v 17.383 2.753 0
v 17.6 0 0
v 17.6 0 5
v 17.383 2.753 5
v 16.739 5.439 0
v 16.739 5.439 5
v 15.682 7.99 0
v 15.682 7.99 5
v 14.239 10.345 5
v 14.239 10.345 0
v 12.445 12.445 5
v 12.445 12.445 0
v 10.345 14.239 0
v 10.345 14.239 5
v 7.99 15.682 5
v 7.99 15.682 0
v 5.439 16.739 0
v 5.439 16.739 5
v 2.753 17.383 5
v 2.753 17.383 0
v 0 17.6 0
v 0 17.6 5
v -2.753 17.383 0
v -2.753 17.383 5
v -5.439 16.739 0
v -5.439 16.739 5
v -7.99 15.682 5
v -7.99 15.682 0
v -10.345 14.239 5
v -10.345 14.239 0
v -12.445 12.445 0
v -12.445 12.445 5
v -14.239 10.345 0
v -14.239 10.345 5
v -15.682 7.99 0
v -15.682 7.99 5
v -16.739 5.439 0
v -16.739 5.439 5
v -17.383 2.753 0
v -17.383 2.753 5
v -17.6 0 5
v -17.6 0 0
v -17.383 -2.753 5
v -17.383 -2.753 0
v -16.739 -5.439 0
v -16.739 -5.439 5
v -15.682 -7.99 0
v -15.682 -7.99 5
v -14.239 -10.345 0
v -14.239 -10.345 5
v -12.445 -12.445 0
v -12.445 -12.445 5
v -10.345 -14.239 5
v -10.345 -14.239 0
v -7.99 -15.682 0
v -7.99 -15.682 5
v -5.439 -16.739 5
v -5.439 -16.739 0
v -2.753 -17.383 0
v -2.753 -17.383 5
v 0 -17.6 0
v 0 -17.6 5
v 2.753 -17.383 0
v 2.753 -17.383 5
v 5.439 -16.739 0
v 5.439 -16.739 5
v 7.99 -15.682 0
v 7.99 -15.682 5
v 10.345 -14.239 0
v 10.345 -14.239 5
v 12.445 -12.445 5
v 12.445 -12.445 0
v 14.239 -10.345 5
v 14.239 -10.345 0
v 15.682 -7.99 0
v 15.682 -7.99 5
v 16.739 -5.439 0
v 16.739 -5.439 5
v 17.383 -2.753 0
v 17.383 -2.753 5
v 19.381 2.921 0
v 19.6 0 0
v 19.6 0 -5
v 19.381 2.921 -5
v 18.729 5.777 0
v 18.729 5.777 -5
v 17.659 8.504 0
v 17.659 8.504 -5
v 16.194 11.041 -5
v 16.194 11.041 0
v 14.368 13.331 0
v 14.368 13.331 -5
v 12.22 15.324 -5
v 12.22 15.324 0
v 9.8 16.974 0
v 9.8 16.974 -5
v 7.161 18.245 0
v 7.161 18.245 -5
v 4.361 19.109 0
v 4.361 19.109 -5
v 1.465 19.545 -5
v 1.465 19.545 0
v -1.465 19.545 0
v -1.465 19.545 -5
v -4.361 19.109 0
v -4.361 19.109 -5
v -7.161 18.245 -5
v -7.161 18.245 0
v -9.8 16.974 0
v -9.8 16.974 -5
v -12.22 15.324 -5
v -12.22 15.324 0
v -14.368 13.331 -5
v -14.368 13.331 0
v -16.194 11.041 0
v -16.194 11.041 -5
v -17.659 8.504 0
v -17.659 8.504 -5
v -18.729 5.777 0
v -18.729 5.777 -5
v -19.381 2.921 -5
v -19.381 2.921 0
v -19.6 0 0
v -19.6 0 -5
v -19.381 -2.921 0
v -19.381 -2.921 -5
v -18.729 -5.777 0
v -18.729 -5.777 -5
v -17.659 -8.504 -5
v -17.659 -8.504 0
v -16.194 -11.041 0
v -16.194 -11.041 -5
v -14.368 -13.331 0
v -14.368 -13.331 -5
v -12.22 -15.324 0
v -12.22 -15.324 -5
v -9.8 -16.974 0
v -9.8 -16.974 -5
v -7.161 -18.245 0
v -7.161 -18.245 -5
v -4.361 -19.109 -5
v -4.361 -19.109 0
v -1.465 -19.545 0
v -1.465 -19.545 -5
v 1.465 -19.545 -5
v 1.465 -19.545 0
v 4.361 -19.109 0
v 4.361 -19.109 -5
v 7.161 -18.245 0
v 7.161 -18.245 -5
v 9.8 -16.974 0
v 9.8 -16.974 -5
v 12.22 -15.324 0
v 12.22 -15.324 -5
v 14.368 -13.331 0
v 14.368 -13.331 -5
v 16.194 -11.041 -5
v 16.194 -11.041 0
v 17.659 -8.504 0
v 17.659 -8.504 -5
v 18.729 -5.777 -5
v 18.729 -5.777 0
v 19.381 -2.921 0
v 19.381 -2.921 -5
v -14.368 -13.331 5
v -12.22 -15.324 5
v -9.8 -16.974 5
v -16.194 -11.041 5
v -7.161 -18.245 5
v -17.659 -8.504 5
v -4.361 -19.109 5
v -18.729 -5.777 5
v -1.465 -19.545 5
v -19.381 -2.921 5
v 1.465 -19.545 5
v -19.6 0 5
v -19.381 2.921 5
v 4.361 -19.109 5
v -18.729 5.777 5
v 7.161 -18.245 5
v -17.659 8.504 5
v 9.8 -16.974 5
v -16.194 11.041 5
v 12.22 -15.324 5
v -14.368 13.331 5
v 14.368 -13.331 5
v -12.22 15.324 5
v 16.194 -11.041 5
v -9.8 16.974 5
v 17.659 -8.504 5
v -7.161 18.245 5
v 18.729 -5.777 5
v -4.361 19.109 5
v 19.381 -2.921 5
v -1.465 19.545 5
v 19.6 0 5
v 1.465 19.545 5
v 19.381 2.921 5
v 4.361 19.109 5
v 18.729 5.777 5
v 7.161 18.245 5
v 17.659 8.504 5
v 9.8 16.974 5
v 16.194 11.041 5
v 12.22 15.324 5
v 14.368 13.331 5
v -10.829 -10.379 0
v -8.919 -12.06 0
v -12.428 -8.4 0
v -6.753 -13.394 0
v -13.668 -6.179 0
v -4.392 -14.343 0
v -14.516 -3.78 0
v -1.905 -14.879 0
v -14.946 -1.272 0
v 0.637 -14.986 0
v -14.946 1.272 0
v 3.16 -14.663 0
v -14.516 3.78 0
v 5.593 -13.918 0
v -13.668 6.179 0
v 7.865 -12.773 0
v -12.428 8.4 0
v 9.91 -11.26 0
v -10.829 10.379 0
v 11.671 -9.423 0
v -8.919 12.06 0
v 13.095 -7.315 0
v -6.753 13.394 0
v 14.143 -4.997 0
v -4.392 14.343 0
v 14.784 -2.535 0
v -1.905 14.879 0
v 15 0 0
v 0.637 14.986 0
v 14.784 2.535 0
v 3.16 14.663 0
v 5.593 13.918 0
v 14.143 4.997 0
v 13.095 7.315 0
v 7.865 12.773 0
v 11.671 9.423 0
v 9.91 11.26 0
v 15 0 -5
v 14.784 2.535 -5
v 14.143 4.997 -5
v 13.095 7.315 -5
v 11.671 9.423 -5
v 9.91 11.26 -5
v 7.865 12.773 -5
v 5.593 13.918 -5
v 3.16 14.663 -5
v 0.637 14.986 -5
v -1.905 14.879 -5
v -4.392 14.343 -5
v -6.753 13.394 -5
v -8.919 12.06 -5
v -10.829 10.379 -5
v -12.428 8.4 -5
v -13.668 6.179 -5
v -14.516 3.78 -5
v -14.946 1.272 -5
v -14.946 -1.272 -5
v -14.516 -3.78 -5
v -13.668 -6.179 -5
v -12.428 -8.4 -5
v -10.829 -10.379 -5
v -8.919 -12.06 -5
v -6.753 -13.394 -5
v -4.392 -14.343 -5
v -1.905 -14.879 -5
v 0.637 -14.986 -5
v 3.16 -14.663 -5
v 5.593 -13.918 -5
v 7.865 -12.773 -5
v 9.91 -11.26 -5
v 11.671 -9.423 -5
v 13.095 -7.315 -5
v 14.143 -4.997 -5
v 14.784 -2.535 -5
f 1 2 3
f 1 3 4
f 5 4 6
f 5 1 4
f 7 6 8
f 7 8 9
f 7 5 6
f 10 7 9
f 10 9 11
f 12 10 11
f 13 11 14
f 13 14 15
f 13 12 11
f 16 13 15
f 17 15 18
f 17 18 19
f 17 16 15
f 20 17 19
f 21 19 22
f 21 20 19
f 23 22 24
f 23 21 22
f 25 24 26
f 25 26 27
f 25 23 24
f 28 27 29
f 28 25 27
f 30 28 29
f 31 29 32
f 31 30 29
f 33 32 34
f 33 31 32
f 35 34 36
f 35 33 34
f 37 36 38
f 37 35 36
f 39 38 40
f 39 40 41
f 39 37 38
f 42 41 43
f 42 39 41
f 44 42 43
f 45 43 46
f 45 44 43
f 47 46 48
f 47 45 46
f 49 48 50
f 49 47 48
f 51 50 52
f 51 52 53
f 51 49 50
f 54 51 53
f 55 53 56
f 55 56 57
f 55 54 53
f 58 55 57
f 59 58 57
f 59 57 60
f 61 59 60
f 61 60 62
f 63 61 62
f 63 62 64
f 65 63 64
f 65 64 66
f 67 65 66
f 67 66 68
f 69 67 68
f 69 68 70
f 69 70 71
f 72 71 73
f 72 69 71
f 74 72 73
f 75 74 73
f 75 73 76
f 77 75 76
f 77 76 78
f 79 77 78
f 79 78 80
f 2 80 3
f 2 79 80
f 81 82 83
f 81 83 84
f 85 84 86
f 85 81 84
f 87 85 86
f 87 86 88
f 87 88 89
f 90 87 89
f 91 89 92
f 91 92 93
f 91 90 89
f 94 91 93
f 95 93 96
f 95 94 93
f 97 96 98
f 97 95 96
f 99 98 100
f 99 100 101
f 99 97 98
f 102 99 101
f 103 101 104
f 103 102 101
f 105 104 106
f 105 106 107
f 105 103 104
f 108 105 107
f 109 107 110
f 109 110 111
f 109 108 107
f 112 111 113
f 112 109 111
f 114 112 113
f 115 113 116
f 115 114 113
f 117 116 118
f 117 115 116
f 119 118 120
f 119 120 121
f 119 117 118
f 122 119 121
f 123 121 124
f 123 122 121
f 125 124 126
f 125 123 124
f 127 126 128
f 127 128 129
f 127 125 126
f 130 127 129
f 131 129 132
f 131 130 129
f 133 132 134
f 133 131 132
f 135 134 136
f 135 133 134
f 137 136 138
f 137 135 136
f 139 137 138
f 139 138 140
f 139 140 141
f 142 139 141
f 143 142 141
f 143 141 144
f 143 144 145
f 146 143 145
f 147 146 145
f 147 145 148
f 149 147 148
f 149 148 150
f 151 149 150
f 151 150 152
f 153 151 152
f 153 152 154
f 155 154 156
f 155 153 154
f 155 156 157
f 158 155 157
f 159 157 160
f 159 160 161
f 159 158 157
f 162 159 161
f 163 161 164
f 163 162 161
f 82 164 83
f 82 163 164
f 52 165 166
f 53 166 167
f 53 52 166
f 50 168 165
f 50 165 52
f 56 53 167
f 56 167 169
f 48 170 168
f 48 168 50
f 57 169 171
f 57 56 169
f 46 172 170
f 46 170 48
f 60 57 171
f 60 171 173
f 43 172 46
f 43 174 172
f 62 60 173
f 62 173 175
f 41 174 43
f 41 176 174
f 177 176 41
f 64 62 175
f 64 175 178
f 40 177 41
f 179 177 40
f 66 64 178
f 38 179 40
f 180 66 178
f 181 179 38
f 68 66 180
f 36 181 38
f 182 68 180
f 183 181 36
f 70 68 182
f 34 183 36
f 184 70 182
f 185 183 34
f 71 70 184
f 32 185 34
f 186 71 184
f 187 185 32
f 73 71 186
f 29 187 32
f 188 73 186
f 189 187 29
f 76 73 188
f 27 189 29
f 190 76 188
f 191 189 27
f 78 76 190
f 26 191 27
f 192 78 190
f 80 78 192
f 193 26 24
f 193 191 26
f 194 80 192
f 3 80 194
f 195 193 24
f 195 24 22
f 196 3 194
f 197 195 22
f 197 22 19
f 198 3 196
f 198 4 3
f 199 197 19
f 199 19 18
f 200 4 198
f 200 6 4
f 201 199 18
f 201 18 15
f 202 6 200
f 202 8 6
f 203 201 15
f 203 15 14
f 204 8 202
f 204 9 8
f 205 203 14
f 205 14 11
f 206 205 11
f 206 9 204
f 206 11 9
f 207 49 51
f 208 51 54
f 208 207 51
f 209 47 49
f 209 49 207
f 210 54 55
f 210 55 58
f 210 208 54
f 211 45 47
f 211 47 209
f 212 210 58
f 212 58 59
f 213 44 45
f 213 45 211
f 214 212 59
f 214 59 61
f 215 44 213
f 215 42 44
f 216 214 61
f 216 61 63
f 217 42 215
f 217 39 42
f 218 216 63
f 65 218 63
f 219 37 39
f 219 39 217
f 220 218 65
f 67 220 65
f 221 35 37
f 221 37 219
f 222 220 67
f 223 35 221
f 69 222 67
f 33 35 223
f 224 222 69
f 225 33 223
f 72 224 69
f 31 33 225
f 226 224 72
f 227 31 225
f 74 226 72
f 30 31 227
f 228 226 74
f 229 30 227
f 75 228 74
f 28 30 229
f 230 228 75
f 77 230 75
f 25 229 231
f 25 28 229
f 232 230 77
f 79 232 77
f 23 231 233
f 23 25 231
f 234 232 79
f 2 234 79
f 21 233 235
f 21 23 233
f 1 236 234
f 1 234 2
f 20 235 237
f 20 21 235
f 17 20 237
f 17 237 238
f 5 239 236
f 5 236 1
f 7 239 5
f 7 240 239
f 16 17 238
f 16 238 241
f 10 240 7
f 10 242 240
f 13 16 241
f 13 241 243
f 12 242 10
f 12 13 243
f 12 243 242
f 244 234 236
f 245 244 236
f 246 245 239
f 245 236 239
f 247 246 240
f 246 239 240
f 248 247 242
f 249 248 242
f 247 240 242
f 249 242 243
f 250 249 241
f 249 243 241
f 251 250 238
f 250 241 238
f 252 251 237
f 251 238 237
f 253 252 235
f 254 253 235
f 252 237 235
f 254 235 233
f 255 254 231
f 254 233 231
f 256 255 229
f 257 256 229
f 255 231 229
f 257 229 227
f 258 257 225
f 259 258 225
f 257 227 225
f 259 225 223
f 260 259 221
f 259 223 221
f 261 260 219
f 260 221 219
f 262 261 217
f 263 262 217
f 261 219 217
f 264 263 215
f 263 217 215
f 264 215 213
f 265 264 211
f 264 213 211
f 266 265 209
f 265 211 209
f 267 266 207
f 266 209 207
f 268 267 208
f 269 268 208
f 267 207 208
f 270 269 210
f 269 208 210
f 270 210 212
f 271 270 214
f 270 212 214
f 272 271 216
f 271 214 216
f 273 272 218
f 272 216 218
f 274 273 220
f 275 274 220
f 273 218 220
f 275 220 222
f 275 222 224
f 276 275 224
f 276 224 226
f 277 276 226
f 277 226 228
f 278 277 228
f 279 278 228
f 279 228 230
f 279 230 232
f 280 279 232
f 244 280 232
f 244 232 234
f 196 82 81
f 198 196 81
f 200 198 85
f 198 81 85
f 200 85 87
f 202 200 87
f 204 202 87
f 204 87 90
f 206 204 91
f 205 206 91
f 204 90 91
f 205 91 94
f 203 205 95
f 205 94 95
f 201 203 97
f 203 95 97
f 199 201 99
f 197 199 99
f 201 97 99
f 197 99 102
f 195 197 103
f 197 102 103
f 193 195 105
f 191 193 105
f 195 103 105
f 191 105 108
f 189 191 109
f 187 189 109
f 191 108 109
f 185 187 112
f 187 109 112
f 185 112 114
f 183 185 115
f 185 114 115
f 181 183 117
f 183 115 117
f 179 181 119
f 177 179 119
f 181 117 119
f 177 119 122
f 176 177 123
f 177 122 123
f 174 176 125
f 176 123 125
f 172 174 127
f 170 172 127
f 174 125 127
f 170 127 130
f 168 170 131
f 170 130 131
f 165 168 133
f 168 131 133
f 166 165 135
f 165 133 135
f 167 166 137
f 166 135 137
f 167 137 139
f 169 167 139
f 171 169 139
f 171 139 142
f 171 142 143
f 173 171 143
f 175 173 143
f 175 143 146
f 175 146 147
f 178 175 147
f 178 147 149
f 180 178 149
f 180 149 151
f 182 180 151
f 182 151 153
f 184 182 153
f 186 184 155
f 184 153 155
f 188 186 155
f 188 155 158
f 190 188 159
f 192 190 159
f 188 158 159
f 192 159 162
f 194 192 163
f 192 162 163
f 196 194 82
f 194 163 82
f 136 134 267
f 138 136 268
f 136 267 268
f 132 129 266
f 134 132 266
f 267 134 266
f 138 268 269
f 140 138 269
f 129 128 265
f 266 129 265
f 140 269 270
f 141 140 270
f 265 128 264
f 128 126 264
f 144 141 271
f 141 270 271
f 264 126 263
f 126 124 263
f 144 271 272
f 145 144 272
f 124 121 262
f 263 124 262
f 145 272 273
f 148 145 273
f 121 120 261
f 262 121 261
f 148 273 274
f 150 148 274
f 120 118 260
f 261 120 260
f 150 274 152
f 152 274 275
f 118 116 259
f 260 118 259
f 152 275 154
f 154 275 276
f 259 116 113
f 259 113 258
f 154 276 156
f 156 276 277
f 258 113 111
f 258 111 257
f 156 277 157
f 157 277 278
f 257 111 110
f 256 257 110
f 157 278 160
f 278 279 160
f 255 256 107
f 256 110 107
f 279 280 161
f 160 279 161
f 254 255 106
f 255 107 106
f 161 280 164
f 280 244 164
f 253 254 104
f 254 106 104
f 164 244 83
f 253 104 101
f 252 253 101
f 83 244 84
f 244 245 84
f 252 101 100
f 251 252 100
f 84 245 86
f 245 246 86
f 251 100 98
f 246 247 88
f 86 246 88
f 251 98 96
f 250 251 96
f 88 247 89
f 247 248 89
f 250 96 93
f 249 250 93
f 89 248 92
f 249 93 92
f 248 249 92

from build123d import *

# Parameters (mm, degrees)
F0_R     = 19.6
F0_R_2   = 17.6
F0_R_3   = 17
F0_R_4   = 15
F1_DEPTH = 5
F2_DEPTH = 5


with BuildPart() as f1:
    # F0 (on Top) → F1 (new body)
    with BuildSketch(Plane.XY):
        Circle(F0_R)
        Circle(F0_R_2, mode=Mode.SUBTRACT)
        Circle(F0_R_2)
        Circle(F0_R_3, mode=Mode.SUBTRACT)
        Circle(F0_R_3)
        Circle(F0_R_4, mode=Mode.SUBTRACT)
    extrude(amount=-F1_DEPTH)

    # F0 (on Top) → F2 (join)
    with BuildSketch(Plane.XY):
        Circle(F0_R)
        Circle(F0_R_2, mode=Mode.SUBTRACT)
    extrude(amount=F2_DEPTH)


solid = f1.part
